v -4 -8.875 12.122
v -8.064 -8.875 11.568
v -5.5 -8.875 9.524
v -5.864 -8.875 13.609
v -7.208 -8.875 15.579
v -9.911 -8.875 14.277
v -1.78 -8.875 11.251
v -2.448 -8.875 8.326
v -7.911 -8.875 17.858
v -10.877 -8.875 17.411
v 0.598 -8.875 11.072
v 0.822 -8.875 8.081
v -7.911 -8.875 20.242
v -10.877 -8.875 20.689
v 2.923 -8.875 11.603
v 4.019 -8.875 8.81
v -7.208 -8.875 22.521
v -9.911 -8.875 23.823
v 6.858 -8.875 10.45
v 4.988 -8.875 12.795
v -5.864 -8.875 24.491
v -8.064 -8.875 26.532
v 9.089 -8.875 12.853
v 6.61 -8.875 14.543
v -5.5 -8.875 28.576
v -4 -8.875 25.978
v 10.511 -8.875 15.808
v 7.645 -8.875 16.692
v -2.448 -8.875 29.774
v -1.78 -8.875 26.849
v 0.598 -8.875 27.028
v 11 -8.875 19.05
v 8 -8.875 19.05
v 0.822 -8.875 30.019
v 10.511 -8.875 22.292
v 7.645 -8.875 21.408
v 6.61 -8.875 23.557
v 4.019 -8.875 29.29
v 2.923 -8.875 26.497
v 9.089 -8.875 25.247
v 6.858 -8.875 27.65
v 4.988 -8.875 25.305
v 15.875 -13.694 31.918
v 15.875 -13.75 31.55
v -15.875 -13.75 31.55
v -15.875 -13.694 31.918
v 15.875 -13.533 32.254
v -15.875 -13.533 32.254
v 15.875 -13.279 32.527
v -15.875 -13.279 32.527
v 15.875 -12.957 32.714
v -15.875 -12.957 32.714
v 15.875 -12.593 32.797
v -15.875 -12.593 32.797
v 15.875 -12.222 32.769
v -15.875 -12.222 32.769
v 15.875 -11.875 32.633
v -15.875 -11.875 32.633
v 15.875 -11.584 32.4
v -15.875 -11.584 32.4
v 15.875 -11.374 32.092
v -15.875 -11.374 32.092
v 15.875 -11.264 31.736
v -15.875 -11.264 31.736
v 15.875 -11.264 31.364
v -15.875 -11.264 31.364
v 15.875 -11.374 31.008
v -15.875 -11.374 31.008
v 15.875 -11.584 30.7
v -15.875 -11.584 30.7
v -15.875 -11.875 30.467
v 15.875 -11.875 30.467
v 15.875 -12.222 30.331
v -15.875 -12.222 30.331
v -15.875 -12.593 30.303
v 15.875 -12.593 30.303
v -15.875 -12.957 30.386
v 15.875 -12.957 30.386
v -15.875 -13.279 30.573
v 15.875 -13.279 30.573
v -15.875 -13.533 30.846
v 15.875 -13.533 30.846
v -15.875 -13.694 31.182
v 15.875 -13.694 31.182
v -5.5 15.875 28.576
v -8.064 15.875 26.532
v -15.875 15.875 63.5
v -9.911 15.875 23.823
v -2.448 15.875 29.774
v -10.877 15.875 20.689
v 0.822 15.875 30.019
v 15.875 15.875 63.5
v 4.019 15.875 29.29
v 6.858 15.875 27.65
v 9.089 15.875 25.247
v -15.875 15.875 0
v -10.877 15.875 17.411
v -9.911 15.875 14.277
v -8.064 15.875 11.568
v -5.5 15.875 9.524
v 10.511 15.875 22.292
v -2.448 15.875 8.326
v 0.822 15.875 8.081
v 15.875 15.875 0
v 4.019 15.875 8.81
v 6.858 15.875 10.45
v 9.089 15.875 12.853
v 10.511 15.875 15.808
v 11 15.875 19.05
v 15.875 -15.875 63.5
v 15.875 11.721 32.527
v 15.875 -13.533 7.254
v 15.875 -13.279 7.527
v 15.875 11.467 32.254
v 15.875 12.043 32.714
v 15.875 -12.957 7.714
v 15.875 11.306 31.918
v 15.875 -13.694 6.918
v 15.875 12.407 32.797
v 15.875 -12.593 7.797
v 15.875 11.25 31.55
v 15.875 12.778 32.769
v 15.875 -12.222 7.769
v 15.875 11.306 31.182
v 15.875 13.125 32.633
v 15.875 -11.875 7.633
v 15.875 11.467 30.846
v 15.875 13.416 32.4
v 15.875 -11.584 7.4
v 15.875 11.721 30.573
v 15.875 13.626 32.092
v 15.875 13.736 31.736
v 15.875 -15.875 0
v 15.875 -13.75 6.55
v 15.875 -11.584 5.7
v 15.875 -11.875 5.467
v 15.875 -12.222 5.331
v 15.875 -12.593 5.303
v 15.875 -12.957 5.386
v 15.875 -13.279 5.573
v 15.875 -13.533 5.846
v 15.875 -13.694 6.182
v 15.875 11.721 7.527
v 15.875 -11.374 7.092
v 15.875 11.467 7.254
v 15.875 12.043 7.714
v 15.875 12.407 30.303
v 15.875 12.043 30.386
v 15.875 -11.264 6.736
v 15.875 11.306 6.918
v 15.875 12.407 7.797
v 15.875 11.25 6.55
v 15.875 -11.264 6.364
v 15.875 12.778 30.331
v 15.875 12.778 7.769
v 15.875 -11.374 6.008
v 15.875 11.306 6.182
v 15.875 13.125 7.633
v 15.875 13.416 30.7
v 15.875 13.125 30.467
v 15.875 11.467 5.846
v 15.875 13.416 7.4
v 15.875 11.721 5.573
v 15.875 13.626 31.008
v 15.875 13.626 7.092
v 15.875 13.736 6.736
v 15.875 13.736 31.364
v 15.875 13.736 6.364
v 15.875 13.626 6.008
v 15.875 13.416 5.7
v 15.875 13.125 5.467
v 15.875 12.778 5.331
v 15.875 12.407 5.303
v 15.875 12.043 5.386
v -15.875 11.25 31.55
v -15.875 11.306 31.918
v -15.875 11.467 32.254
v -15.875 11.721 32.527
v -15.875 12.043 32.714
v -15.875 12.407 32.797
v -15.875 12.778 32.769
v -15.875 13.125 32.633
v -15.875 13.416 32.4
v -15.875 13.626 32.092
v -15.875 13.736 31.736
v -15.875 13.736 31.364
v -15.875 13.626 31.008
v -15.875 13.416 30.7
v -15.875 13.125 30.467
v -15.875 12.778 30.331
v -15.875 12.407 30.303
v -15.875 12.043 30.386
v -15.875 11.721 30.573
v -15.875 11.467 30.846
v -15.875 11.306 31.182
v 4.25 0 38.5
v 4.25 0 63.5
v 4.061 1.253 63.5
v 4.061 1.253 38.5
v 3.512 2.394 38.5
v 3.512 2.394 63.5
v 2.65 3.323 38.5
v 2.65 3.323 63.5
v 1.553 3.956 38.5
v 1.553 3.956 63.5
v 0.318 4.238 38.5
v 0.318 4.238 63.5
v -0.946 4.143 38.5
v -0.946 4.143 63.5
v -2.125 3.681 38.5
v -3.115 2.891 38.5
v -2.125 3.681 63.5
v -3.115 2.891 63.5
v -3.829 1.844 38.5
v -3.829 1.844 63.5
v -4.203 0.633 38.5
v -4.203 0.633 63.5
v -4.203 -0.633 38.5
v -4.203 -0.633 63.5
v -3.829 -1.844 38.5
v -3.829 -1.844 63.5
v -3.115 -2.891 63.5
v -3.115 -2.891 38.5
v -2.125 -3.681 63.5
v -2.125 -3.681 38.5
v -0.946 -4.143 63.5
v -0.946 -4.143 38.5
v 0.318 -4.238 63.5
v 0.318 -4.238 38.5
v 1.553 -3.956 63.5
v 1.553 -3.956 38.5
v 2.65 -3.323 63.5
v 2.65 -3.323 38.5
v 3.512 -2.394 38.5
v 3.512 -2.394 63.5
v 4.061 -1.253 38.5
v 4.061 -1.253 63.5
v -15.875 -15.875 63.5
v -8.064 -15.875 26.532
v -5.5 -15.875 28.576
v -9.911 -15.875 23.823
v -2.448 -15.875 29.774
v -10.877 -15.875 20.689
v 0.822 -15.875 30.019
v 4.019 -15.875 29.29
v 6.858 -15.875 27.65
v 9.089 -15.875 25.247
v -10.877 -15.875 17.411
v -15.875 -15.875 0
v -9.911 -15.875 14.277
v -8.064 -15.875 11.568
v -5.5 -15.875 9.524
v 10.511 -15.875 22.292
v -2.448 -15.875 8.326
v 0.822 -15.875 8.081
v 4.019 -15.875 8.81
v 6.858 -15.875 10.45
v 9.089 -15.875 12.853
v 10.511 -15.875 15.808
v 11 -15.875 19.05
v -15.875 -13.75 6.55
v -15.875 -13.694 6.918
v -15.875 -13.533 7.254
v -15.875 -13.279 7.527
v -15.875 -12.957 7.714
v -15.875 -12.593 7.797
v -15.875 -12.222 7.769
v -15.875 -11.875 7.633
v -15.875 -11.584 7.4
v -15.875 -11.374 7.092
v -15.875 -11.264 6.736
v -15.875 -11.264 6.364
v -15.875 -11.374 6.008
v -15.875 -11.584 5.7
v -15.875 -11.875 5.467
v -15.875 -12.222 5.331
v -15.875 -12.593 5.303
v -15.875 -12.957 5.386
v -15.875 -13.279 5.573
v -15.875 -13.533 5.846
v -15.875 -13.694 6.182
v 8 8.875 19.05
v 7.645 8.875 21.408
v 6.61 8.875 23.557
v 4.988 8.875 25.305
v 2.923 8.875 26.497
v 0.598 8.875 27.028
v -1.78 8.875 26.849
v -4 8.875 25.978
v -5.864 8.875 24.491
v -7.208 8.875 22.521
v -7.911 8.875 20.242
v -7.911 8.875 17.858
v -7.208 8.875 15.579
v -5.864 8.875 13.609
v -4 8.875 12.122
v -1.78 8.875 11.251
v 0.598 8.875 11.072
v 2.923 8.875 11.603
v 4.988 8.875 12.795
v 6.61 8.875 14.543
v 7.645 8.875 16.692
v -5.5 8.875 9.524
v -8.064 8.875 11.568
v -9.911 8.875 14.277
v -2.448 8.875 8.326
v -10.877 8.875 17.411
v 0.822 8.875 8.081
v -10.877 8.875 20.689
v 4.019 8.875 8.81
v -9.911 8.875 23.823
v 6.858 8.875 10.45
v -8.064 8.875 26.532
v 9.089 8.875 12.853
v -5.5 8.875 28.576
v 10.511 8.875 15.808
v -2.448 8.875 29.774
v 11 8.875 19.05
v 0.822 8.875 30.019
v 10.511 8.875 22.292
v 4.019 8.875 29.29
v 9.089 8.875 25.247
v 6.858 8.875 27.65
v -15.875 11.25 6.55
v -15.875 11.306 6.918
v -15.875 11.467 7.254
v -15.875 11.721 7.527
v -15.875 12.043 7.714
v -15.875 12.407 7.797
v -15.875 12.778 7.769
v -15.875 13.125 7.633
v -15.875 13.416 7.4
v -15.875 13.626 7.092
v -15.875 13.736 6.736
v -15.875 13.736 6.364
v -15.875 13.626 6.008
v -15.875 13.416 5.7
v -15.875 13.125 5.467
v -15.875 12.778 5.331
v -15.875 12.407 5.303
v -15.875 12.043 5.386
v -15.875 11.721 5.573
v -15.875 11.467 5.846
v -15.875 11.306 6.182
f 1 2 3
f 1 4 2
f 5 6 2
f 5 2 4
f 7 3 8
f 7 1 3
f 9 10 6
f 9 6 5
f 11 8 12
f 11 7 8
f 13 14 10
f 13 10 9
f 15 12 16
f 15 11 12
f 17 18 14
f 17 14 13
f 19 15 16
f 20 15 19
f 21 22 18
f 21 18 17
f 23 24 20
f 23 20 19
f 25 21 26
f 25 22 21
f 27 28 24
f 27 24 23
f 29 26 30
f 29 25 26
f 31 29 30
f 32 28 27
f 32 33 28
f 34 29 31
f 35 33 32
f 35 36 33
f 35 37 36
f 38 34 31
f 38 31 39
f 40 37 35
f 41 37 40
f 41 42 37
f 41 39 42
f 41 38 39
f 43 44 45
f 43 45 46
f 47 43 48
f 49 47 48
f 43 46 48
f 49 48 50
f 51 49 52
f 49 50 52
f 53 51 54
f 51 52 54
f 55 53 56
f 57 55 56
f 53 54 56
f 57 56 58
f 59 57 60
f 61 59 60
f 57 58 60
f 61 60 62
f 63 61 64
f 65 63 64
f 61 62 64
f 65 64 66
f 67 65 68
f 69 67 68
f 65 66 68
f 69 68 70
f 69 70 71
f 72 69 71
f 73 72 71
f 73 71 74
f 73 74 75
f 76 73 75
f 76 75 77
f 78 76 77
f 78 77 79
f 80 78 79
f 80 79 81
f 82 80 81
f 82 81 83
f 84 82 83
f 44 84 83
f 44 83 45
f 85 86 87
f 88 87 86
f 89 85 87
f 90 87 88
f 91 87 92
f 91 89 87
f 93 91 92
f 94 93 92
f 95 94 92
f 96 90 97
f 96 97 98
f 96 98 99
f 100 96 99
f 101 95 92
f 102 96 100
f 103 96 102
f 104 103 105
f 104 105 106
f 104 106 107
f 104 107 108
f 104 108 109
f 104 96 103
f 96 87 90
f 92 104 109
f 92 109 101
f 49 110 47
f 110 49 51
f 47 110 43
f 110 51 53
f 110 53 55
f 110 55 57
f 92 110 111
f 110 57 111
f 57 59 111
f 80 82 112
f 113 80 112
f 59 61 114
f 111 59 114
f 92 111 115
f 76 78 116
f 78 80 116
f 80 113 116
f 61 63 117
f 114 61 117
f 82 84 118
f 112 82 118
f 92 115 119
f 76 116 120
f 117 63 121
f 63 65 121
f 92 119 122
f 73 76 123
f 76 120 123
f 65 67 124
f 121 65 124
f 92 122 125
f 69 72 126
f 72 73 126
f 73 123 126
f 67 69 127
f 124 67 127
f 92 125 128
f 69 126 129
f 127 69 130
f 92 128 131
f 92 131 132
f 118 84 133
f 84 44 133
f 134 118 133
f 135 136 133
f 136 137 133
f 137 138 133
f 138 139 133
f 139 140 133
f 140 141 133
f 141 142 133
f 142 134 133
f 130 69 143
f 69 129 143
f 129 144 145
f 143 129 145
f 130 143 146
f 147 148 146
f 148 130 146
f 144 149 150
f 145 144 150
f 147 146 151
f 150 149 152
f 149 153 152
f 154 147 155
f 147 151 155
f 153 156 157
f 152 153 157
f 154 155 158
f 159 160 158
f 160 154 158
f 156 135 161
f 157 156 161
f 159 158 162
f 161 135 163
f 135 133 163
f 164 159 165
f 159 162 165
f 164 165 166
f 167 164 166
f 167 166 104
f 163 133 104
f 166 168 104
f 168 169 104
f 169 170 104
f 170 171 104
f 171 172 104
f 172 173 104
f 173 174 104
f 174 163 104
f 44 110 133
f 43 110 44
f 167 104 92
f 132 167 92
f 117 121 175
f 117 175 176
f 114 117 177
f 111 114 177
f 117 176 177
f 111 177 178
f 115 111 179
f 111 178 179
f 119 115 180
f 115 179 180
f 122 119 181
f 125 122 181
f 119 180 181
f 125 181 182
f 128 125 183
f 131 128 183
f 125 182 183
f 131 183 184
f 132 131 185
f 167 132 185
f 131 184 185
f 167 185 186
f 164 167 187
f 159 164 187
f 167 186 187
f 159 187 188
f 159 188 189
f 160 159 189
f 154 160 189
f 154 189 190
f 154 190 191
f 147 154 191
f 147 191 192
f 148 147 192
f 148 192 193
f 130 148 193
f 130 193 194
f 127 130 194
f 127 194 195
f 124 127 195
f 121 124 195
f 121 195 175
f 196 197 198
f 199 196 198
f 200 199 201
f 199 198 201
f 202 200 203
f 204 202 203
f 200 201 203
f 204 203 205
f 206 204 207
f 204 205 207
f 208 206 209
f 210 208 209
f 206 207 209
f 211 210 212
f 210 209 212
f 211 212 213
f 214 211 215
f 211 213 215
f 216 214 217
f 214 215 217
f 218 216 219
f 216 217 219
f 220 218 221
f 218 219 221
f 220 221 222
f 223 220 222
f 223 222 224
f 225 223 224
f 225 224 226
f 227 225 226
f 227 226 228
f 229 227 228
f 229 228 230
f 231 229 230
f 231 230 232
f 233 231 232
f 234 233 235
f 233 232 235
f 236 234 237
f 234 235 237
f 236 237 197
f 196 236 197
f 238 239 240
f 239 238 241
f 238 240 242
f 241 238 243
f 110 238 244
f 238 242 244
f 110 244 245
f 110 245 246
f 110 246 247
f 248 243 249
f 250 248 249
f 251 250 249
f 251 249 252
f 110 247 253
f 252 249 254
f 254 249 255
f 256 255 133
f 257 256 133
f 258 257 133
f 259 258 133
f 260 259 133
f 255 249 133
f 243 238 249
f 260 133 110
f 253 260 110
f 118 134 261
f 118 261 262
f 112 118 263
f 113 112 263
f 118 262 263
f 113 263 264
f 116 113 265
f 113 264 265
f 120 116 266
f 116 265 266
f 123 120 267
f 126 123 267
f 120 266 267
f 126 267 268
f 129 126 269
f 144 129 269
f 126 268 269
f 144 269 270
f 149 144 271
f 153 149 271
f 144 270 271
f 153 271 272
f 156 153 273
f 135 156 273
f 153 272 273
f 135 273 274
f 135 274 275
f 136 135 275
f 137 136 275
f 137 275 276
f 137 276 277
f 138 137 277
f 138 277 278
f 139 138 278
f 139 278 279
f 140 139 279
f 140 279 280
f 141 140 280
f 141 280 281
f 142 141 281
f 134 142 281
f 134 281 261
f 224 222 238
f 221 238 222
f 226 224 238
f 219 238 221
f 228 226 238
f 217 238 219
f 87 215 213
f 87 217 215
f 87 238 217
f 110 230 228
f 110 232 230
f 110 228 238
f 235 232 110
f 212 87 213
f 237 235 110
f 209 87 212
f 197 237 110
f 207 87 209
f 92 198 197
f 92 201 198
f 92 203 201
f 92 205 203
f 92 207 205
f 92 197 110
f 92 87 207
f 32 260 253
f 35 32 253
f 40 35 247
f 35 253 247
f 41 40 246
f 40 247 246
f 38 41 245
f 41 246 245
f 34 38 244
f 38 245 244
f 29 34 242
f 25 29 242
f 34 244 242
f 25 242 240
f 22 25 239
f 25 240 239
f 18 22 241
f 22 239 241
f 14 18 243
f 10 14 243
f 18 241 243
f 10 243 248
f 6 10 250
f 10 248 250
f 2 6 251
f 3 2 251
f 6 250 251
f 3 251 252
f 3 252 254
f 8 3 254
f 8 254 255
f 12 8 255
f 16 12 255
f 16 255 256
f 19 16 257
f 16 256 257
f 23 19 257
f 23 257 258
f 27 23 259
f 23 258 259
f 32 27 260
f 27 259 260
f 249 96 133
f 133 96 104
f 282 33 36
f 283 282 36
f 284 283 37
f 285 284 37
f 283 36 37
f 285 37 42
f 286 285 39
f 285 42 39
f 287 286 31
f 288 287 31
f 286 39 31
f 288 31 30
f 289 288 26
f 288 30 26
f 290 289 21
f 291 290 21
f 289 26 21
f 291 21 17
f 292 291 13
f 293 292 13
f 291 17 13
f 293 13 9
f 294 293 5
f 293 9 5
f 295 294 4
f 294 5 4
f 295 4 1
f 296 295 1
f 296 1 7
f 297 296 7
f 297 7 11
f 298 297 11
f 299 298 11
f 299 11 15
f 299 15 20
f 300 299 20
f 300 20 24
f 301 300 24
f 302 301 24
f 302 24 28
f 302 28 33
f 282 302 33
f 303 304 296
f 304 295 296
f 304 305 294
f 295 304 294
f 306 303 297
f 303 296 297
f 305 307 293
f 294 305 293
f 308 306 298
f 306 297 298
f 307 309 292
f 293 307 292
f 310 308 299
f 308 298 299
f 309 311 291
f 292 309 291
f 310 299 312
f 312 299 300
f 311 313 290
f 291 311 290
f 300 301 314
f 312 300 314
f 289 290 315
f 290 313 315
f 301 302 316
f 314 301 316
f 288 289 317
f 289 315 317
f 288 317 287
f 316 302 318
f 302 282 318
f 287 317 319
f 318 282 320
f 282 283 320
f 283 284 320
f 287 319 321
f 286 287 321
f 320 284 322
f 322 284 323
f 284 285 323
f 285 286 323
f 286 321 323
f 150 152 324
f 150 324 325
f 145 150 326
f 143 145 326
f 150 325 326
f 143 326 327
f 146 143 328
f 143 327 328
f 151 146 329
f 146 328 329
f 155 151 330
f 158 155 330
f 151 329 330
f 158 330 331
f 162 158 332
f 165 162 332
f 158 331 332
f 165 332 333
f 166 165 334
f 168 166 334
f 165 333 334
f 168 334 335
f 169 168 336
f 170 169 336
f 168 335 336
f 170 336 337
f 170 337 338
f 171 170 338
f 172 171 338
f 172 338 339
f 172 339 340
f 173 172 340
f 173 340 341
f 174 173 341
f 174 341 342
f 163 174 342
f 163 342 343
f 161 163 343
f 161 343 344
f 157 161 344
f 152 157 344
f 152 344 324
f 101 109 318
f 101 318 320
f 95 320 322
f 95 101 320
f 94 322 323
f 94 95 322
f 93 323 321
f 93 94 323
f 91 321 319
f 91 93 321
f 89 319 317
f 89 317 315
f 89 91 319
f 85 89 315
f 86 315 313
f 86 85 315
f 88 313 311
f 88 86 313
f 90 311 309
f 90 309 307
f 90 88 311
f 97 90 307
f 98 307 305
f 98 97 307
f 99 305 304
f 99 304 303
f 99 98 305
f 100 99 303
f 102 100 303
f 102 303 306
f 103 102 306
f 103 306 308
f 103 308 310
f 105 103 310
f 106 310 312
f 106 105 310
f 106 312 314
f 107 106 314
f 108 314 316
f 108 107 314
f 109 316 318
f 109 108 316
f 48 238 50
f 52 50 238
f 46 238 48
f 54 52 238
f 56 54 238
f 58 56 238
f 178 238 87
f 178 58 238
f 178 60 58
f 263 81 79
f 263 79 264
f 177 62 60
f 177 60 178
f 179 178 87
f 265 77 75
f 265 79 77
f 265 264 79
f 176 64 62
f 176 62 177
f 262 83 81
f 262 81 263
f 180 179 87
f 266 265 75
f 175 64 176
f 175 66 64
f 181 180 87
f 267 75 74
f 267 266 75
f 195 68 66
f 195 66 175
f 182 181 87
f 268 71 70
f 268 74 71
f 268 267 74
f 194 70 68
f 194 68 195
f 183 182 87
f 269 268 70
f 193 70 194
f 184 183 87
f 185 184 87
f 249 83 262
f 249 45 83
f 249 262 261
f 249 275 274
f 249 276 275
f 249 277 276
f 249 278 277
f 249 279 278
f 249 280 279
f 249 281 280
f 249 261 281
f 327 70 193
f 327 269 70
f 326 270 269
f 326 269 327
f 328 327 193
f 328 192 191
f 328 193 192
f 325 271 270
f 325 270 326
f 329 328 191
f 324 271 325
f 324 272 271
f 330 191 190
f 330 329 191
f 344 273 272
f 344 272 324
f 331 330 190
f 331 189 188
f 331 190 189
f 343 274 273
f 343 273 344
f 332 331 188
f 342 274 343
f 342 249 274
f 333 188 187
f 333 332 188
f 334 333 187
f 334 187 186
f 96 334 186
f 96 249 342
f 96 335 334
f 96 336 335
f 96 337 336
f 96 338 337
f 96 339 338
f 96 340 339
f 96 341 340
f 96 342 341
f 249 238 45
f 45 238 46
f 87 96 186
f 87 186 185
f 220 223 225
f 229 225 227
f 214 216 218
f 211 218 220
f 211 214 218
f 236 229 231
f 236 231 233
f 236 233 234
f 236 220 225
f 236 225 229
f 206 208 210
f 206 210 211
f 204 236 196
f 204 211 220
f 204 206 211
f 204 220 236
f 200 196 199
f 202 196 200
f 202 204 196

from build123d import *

# Parameters (mm, degrees)
SKETCH_W        = 31.75
SKETCH_H        = 31.75
PAD_DEPTH       = 63.5
SKETCH001_R     = 11
POCKET_DEPTH    = 7
SKETCH002_R     = 8
POCKET001_DEPTH = 31.751
SKETCH003_R     = 1.25
HOLE_DEPTH      = 31.751
SKETCH004_R     = 4.25
HOLE001_DEPTH   = 25


with BuildPart() as part:
    # Sketch → Pad (new body)
    with BuildSketch(Plane.XY):
        Rectangle(SKETCH_W, SKETCH_H)
    extrude(amount=PAD_DEPTH)

    # Sketch001 (on Face2 of Pad) → Pocket (cut)
    with BuildSketch(Plane.XZ.offset(15.875)):
        with Locations((0, 19.05)):
            Circle(SKETCH001_R)
    pocket = extrude(amount=-POCKET_DEPTH, mode=Mode.SUBTRACT)

    # Mirrored: Pocket across XZ
    add(pocket.mirror(Plane.XZ), mode=Mode.SUBTRACT)

    # Sketch002 (on Face3 of Mirrored) → Pocket001 (cut, through all)
    with BuildSketch(Plane.XZ.offset(15.875)):
        with Locations((0, 19.05)):
            Circle(SKETCH002_R)
    extrude(amount=-POCKET001_DEPTH, mode=Mode.SUBTRACT)

    # Sketch003 (on Face1 of Pocket001) → Hole (cut, through all)
    with BuildSketch(Plane(origin=(-15.875, 0, 0), x_dir=(0, -1, 0), z_dir=(-1, 0, 0))):
        with Locations((12.5, 31.55)):
            Circle(SKETCH003_R)
        with Locations((12.5, 6.55)):
            Circle(SKETCH003_R)
        with Locations((-12.5, 6.55)):
            Circle(SKETCH003_R)
        with Locations((-12.5, 31.55)):
            Circle(SKETCH003_R)
    extrude(amount=-HOLE_DEPTH, mode=Mode.SUBTRACT)

    # Sketch004 (on Face4 of Hole) → Hole001 (cut)
    with BuildSketch(Plane.XY.offset(63.5)):
        Circle(SKETCH004_R)
    extrude(amount=-HOLE001_DEPTH, mode=Mode.SUBTRACT)


solid = part.part
